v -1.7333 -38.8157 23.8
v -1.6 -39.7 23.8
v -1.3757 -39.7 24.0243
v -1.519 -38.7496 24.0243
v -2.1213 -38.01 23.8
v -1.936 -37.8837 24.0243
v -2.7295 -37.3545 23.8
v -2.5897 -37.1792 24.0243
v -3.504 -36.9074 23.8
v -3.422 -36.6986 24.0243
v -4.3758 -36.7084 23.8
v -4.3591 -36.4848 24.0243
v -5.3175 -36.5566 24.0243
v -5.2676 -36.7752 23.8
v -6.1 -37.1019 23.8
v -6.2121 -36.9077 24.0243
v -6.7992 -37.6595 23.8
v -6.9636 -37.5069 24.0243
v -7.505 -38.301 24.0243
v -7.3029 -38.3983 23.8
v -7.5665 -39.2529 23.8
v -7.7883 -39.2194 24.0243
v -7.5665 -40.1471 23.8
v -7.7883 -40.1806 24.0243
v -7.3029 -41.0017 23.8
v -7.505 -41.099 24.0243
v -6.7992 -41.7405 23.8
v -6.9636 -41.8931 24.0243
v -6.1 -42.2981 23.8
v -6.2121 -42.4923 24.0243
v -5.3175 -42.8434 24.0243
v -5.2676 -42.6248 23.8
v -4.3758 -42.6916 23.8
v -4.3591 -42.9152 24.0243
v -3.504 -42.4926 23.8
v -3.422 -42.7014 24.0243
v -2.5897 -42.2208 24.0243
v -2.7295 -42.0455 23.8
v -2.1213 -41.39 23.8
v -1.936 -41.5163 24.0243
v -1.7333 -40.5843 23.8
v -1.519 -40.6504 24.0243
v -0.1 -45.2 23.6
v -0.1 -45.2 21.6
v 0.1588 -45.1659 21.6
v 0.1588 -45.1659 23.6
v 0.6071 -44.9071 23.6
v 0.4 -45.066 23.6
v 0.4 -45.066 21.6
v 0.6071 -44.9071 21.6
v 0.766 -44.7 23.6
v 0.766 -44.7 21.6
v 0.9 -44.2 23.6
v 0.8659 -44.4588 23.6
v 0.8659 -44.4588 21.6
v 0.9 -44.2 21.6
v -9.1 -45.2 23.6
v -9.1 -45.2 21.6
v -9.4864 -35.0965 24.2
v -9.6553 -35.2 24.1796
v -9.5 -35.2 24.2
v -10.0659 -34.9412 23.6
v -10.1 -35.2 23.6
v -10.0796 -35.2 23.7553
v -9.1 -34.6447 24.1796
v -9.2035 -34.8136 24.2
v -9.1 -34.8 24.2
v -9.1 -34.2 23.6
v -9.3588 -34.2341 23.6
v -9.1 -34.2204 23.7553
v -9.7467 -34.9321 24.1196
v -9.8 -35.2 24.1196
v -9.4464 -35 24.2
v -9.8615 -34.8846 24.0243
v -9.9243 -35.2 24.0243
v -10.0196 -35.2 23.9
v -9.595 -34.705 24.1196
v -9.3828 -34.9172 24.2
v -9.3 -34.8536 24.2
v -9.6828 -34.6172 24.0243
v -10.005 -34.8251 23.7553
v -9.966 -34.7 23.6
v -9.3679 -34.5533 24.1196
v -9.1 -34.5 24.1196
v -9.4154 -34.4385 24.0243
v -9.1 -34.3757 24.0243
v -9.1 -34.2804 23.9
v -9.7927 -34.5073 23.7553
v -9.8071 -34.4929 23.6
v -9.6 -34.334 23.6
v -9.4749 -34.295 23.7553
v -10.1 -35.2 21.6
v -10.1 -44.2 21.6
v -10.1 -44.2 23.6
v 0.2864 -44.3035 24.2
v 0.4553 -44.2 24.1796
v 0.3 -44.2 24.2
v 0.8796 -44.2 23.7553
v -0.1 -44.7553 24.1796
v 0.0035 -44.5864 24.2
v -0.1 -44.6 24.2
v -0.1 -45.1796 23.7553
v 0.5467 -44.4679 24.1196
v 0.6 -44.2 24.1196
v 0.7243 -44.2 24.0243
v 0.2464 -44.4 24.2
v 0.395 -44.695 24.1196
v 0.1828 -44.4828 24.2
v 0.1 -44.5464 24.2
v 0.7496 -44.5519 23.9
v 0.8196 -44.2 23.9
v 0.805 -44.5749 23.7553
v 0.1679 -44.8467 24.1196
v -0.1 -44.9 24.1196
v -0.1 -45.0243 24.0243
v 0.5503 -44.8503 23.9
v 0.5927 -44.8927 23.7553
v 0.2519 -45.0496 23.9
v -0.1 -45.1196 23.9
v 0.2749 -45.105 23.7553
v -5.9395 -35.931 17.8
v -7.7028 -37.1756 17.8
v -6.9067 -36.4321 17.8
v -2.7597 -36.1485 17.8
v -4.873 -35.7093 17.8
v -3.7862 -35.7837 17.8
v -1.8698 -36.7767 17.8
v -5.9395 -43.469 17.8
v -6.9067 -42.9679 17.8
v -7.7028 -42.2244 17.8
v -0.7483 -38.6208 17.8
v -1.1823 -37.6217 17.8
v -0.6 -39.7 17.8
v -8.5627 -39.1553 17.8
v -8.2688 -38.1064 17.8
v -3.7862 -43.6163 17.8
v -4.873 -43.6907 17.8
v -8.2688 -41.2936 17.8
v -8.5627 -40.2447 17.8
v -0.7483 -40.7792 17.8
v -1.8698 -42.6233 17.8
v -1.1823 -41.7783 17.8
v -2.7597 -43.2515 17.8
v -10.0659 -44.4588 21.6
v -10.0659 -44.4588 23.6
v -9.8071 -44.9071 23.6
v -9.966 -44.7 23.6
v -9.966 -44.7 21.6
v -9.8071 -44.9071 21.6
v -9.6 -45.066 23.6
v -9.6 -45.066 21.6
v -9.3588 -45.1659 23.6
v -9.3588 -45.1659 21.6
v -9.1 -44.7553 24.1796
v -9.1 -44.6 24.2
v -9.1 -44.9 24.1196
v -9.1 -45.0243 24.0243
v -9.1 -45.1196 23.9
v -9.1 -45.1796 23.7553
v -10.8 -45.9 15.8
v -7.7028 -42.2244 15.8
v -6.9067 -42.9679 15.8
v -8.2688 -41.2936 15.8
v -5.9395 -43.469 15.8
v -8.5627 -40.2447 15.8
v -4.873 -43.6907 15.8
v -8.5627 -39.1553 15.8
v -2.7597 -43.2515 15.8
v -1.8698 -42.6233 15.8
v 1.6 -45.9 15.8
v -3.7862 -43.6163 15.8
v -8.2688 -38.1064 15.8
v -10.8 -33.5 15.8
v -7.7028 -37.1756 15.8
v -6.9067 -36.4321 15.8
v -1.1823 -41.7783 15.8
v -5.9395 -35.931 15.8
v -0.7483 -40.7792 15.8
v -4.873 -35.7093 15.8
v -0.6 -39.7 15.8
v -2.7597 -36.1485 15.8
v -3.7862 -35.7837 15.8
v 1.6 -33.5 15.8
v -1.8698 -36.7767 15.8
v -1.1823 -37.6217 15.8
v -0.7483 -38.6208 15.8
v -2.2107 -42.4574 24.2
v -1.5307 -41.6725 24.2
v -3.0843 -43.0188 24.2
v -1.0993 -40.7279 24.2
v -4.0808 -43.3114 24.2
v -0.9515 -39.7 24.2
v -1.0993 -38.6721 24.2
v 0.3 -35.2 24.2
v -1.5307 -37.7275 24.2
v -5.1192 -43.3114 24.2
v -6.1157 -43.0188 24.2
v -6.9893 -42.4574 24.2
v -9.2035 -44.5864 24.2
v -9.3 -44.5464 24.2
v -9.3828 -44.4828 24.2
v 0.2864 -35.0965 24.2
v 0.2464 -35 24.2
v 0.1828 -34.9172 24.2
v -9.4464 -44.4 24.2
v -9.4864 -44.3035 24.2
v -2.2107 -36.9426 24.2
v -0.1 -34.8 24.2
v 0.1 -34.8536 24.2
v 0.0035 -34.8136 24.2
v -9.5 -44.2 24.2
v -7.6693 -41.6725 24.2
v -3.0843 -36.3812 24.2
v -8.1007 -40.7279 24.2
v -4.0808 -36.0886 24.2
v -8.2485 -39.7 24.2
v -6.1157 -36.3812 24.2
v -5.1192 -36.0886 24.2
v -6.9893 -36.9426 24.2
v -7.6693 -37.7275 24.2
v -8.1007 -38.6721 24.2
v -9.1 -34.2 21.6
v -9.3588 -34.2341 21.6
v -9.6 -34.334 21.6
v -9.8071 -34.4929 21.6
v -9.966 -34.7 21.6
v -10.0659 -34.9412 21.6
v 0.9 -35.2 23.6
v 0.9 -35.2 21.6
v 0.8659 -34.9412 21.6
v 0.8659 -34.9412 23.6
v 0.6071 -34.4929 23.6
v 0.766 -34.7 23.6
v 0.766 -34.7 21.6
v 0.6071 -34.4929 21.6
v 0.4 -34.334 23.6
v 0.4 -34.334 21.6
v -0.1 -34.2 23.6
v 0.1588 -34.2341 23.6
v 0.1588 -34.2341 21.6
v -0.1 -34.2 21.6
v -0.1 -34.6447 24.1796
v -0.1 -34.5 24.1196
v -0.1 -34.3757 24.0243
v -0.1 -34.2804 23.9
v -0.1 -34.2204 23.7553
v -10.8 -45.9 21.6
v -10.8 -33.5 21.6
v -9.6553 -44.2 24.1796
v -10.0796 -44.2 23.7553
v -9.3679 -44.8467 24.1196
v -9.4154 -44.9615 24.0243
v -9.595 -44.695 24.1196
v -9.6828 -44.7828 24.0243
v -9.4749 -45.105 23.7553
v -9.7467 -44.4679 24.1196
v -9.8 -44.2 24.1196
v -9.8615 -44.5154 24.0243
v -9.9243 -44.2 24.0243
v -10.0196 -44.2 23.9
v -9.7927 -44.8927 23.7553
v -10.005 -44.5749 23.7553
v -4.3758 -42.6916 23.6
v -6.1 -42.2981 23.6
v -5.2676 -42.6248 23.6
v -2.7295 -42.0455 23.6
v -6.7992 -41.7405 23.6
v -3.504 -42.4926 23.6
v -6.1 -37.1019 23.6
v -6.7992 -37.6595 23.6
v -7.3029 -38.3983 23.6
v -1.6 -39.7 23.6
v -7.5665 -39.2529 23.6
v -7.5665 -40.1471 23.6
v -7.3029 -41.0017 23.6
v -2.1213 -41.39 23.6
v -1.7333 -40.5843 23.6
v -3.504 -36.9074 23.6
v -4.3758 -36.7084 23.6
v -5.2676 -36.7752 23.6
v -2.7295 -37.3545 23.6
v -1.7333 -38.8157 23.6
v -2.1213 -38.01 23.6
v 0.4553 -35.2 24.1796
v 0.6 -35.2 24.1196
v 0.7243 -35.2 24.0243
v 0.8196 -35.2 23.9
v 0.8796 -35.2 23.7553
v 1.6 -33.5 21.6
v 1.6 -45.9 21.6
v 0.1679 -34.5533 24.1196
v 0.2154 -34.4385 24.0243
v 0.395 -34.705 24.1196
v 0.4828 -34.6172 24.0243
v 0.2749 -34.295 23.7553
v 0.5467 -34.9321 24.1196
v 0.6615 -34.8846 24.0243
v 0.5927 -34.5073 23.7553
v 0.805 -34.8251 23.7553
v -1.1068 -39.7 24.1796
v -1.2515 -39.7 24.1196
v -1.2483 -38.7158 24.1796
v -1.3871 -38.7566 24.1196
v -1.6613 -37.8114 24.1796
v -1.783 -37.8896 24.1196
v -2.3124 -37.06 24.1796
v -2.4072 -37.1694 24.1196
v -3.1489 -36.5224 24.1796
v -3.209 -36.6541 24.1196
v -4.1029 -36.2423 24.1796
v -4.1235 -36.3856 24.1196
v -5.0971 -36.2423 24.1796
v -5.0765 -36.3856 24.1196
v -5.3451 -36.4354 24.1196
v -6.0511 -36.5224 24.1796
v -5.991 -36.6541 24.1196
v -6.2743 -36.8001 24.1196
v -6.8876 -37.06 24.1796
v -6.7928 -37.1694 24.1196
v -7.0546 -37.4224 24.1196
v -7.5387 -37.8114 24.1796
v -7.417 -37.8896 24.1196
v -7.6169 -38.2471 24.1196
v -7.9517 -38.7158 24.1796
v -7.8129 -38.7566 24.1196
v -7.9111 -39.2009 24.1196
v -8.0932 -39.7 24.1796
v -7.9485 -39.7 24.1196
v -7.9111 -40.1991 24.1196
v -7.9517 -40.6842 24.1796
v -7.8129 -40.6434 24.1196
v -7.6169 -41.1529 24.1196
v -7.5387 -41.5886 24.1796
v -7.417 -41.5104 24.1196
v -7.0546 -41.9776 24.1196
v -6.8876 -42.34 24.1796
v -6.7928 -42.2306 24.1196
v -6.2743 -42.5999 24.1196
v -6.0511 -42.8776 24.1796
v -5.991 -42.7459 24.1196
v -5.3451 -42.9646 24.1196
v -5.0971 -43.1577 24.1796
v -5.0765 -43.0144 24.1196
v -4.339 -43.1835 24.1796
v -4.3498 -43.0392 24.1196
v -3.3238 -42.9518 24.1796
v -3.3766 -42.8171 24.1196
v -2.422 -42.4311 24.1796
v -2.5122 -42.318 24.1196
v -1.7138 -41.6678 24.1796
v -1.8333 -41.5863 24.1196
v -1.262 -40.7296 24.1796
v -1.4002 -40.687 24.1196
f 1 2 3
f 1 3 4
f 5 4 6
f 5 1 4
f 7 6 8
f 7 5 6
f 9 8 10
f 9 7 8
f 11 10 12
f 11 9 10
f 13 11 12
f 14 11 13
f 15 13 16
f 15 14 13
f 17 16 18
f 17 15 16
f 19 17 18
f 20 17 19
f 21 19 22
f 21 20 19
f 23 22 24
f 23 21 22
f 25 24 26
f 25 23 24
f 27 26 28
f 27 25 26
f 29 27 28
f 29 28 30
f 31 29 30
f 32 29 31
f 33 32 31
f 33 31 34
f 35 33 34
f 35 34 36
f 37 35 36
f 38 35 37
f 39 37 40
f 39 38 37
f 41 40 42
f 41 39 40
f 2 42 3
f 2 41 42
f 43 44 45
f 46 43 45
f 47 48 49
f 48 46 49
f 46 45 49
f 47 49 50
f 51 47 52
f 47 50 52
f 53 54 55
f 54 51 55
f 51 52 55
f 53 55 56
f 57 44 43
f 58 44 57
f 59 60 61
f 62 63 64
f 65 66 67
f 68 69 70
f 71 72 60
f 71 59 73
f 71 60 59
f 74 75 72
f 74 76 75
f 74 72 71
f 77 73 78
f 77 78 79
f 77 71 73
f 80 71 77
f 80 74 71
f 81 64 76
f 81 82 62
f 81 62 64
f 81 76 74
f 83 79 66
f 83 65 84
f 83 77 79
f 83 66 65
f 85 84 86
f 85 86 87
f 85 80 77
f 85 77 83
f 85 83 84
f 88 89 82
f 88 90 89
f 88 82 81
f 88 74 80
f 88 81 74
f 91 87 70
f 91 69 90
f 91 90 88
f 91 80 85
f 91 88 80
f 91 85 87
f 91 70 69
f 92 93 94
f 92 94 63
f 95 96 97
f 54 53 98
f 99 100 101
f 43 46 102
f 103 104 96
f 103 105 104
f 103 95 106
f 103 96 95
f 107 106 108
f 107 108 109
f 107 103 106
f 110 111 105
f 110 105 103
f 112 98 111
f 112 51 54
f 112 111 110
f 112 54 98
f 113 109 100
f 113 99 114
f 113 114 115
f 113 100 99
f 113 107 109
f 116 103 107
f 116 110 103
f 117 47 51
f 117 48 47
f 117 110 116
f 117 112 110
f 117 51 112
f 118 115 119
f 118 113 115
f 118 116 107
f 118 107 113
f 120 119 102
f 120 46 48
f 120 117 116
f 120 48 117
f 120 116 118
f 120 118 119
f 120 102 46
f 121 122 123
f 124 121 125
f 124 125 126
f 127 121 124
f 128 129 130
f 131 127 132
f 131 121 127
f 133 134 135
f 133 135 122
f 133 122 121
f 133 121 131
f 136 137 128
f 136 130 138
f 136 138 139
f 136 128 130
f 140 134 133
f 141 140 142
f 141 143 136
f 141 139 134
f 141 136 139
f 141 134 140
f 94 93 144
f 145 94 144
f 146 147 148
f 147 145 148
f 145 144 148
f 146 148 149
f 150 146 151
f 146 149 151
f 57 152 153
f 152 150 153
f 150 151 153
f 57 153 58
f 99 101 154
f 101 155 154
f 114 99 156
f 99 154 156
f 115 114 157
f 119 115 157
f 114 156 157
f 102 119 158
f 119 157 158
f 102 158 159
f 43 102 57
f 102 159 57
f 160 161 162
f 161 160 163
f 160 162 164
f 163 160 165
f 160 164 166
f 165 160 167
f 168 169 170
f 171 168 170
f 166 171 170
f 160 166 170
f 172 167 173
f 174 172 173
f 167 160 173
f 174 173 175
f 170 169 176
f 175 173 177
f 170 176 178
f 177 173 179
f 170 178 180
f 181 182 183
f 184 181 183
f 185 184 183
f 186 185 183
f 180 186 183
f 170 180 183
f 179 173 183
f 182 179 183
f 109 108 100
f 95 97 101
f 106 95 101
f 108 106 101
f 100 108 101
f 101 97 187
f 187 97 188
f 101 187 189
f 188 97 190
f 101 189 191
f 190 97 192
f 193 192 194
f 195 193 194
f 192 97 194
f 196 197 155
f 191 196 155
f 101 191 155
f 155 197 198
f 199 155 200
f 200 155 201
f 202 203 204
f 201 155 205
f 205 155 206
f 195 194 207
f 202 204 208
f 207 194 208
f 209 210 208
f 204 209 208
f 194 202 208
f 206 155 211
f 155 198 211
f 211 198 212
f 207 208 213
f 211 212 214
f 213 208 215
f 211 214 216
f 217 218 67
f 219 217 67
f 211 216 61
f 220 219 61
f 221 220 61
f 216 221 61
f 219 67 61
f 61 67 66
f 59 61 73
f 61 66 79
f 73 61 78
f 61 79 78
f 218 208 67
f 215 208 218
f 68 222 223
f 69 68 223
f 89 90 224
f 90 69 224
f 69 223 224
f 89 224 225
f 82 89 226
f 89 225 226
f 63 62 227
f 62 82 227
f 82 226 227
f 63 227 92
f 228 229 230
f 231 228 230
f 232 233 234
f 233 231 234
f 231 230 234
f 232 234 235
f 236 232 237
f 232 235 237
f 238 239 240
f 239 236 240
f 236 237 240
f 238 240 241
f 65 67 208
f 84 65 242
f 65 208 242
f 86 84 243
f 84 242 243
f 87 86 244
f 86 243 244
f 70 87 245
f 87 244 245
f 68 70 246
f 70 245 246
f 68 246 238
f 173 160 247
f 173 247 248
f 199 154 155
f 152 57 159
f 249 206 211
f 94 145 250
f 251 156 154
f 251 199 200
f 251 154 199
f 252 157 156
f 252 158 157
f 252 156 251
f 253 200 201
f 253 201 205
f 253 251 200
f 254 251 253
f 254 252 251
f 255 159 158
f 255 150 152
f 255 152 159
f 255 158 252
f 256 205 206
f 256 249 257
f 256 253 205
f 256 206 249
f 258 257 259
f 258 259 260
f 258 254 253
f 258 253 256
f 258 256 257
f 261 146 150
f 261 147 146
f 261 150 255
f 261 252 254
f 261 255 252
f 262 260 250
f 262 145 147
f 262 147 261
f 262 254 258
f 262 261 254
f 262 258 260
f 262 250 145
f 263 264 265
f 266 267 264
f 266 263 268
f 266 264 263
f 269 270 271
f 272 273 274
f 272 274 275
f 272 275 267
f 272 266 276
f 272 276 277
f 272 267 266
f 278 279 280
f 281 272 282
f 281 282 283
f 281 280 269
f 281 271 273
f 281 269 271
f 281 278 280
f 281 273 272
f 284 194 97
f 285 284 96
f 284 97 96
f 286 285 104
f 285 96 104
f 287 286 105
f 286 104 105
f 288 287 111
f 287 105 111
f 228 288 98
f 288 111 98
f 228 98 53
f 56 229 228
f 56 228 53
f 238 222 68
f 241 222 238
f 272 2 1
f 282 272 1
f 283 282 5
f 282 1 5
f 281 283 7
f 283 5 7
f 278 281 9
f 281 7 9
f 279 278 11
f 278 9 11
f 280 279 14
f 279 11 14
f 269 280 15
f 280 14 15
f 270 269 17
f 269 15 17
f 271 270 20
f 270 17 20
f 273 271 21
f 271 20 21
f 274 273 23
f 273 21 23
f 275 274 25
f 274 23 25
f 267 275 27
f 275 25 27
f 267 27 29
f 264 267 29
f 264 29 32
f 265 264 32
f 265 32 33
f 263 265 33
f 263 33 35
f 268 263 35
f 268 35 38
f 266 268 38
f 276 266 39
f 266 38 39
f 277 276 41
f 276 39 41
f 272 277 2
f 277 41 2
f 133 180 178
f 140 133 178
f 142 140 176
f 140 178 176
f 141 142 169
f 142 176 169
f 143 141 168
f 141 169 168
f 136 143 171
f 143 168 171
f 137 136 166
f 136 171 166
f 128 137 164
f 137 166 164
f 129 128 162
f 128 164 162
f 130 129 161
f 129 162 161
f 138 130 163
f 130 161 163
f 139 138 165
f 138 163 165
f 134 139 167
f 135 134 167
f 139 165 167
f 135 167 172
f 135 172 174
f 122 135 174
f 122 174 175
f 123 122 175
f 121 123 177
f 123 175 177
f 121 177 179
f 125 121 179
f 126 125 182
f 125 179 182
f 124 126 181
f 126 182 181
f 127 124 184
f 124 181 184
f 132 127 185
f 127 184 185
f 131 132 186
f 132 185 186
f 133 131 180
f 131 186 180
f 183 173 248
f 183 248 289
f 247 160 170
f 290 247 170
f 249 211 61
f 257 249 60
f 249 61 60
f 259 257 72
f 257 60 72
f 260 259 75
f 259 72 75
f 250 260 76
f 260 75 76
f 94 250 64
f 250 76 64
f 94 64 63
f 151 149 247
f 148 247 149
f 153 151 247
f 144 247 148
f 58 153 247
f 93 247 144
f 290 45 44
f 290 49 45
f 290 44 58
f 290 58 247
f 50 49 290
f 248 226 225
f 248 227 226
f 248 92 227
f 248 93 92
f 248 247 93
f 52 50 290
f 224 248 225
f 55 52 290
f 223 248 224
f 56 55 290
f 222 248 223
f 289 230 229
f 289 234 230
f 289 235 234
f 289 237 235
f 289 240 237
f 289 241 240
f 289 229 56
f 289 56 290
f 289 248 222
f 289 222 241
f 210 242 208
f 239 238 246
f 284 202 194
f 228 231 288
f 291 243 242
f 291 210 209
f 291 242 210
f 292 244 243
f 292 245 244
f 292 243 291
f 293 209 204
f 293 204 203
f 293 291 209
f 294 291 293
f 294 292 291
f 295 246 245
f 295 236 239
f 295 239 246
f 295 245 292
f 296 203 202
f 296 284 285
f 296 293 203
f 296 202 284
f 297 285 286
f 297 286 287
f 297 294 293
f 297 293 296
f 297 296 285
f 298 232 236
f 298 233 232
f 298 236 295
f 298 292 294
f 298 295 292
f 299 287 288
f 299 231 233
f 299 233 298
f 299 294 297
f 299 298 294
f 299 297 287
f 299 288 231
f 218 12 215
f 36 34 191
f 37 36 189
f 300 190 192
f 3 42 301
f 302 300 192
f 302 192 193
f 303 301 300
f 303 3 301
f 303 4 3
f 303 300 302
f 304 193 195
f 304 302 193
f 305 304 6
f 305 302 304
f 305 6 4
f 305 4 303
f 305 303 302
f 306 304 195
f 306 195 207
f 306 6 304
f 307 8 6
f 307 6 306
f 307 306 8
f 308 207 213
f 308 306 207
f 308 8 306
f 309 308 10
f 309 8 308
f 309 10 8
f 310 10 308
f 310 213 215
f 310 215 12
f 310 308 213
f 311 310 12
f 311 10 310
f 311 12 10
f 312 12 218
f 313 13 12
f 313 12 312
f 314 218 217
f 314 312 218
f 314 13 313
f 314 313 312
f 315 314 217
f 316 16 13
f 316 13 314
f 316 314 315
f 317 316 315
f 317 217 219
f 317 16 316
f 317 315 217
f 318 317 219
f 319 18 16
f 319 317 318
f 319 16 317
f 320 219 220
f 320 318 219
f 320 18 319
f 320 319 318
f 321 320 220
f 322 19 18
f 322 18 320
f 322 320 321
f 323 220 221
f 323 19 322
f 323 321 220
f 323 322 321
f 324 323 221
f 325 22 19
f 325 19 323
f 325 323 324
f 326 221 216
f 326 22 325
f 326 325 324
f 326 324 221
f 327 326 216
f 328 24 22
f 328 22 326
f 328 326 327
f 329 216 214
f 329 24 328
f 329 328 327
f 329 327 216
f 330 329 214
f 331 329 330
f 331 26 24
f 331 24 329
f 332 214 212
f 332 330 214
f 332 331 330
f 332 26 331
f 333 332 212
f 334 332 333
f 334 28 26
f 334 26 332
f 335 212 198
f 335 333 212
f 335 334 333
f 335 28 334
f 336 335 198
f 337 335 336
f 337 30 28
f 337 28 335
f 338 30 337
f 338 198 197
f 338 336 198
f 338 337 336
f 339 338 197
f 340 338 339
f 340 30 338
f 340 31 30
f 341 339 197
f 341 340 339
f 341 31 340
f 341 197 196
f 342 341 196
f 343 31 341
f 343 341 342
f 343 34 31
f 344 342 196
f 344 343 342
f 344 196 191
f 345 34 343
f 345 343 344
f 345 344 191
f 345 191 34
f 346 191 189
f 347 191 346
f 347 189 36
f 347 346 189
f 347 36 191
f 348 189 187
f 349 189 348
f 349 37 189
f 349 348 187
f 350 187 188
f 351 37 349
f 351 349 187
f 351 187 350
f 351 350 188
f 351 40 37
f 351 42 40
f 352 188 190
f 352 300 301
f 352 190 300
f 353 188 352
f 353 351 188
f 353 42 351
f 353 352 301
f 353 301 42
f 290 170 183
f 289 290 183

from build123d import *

# Parameters (mm, degrees)
SKETCH033_W     = 12.4
SKETCH033_H     = 12.4
PAD015_DEPTH    = 5.8
PAD016_DEPTH    = 2.6
SKETCH035_R     = 3
POCKET010_DEPTH = 0.6
SKETCH036_R     = 4
POCKET011_DEPTH = 2
CHAMFER_SIZE    = 0.4
FILLET_R        = 0.6


with BuildPart() as part:
    # Sketch033 → Pad015 (new body)
    with BuildSketch(Plane.XY):
        Rectangle(SKETCH033_W, SKETCH033_H)
    extrude(amount=PAD015_DEPTH)

    # Sketch034 (on Face6 of Pad015) → Pad016 (join)
    with BuildSketch(Plane.XY.offset(5.8)):
        with BuildLine():
            Line((-4.5, 5.5), (4.5, 5.5))
            ThreePointArc((5.5, 4.5), (5.207107, 5.207107), (4.5, 5.5))
            Line((5.5, 4.5), (5.5, -4.5))
            ThreePointArc((4.5, -5.5), (5.207107, -5.207107), (5.5, -4.5))
            Line((4.5, -5.5), (-4.5, -5.5))
            ThreePointArc((-5.5, -4.5), (-5.207107, -5.207107), (-4.5, -5.5))
            Line((-5.5, -4.5), (-5.5, 4.5))
            ThreePointArc((-4.5, 5.5), (-5.207107, 5.207107), (-5.5, 4.5))
        make_face()
    extrude(amount=PAD016_DEPTH)

    # Sketch035 (on Face15 of Pad016) → Pocket010 (cut)
    with BuildSketch(Plane.XY.offset(8.4)):
        Circle(SKETCH035_R)
    extrude(amount=-POCKET010_DEPTH, mode=Mode.SUBTRACT)

    # Sketch036 (on Face4 of Pocket010) → Pocket011 (cut)
    with BuildSketch(Plane(origin=(0, 0, 0), x_dir=(1, 0, 0), z_dir=(0, 0, -1))):
        Circle(SKETCH036_R)
    extrude(amount=-POCKET011_DEPTH, mode=Mode.SUBTRACT)

    # Chamfer
    chamfer_edges = [part.edges().sort_by_distance(p)[0] for p in [
        (-3, 0, 8.4),
    ]]
    chamfer(chamfer_edges, length=CHAMFER_SIZE)

    # Fillet
    fillet_edges = [part.edges().sort_by_distance(p)[0] for p in [
        (0, -5.5, 8.4),
        (-5.207107, -5.207107, 8.4),
        (-5.5, 0, 8.4),
        (-5.207107, 5.207107, 8.4),
        (0, 5.5, 8.4),
        (-3.4, 0, 8.4),
        (5.207107, -5.207107, 8.4),
        (5.207107, 5.207107, 8.4),
        (5.5, 0, 8.4),
    ]]
    fillet(fillet_edges, radius=FILLET_R)


with BuildPart() as part_1:
    # Body004 placement: moved
    add(part.part.moved(Location((-4.6, -39.7, 15.8))))


solid = part_1.part
